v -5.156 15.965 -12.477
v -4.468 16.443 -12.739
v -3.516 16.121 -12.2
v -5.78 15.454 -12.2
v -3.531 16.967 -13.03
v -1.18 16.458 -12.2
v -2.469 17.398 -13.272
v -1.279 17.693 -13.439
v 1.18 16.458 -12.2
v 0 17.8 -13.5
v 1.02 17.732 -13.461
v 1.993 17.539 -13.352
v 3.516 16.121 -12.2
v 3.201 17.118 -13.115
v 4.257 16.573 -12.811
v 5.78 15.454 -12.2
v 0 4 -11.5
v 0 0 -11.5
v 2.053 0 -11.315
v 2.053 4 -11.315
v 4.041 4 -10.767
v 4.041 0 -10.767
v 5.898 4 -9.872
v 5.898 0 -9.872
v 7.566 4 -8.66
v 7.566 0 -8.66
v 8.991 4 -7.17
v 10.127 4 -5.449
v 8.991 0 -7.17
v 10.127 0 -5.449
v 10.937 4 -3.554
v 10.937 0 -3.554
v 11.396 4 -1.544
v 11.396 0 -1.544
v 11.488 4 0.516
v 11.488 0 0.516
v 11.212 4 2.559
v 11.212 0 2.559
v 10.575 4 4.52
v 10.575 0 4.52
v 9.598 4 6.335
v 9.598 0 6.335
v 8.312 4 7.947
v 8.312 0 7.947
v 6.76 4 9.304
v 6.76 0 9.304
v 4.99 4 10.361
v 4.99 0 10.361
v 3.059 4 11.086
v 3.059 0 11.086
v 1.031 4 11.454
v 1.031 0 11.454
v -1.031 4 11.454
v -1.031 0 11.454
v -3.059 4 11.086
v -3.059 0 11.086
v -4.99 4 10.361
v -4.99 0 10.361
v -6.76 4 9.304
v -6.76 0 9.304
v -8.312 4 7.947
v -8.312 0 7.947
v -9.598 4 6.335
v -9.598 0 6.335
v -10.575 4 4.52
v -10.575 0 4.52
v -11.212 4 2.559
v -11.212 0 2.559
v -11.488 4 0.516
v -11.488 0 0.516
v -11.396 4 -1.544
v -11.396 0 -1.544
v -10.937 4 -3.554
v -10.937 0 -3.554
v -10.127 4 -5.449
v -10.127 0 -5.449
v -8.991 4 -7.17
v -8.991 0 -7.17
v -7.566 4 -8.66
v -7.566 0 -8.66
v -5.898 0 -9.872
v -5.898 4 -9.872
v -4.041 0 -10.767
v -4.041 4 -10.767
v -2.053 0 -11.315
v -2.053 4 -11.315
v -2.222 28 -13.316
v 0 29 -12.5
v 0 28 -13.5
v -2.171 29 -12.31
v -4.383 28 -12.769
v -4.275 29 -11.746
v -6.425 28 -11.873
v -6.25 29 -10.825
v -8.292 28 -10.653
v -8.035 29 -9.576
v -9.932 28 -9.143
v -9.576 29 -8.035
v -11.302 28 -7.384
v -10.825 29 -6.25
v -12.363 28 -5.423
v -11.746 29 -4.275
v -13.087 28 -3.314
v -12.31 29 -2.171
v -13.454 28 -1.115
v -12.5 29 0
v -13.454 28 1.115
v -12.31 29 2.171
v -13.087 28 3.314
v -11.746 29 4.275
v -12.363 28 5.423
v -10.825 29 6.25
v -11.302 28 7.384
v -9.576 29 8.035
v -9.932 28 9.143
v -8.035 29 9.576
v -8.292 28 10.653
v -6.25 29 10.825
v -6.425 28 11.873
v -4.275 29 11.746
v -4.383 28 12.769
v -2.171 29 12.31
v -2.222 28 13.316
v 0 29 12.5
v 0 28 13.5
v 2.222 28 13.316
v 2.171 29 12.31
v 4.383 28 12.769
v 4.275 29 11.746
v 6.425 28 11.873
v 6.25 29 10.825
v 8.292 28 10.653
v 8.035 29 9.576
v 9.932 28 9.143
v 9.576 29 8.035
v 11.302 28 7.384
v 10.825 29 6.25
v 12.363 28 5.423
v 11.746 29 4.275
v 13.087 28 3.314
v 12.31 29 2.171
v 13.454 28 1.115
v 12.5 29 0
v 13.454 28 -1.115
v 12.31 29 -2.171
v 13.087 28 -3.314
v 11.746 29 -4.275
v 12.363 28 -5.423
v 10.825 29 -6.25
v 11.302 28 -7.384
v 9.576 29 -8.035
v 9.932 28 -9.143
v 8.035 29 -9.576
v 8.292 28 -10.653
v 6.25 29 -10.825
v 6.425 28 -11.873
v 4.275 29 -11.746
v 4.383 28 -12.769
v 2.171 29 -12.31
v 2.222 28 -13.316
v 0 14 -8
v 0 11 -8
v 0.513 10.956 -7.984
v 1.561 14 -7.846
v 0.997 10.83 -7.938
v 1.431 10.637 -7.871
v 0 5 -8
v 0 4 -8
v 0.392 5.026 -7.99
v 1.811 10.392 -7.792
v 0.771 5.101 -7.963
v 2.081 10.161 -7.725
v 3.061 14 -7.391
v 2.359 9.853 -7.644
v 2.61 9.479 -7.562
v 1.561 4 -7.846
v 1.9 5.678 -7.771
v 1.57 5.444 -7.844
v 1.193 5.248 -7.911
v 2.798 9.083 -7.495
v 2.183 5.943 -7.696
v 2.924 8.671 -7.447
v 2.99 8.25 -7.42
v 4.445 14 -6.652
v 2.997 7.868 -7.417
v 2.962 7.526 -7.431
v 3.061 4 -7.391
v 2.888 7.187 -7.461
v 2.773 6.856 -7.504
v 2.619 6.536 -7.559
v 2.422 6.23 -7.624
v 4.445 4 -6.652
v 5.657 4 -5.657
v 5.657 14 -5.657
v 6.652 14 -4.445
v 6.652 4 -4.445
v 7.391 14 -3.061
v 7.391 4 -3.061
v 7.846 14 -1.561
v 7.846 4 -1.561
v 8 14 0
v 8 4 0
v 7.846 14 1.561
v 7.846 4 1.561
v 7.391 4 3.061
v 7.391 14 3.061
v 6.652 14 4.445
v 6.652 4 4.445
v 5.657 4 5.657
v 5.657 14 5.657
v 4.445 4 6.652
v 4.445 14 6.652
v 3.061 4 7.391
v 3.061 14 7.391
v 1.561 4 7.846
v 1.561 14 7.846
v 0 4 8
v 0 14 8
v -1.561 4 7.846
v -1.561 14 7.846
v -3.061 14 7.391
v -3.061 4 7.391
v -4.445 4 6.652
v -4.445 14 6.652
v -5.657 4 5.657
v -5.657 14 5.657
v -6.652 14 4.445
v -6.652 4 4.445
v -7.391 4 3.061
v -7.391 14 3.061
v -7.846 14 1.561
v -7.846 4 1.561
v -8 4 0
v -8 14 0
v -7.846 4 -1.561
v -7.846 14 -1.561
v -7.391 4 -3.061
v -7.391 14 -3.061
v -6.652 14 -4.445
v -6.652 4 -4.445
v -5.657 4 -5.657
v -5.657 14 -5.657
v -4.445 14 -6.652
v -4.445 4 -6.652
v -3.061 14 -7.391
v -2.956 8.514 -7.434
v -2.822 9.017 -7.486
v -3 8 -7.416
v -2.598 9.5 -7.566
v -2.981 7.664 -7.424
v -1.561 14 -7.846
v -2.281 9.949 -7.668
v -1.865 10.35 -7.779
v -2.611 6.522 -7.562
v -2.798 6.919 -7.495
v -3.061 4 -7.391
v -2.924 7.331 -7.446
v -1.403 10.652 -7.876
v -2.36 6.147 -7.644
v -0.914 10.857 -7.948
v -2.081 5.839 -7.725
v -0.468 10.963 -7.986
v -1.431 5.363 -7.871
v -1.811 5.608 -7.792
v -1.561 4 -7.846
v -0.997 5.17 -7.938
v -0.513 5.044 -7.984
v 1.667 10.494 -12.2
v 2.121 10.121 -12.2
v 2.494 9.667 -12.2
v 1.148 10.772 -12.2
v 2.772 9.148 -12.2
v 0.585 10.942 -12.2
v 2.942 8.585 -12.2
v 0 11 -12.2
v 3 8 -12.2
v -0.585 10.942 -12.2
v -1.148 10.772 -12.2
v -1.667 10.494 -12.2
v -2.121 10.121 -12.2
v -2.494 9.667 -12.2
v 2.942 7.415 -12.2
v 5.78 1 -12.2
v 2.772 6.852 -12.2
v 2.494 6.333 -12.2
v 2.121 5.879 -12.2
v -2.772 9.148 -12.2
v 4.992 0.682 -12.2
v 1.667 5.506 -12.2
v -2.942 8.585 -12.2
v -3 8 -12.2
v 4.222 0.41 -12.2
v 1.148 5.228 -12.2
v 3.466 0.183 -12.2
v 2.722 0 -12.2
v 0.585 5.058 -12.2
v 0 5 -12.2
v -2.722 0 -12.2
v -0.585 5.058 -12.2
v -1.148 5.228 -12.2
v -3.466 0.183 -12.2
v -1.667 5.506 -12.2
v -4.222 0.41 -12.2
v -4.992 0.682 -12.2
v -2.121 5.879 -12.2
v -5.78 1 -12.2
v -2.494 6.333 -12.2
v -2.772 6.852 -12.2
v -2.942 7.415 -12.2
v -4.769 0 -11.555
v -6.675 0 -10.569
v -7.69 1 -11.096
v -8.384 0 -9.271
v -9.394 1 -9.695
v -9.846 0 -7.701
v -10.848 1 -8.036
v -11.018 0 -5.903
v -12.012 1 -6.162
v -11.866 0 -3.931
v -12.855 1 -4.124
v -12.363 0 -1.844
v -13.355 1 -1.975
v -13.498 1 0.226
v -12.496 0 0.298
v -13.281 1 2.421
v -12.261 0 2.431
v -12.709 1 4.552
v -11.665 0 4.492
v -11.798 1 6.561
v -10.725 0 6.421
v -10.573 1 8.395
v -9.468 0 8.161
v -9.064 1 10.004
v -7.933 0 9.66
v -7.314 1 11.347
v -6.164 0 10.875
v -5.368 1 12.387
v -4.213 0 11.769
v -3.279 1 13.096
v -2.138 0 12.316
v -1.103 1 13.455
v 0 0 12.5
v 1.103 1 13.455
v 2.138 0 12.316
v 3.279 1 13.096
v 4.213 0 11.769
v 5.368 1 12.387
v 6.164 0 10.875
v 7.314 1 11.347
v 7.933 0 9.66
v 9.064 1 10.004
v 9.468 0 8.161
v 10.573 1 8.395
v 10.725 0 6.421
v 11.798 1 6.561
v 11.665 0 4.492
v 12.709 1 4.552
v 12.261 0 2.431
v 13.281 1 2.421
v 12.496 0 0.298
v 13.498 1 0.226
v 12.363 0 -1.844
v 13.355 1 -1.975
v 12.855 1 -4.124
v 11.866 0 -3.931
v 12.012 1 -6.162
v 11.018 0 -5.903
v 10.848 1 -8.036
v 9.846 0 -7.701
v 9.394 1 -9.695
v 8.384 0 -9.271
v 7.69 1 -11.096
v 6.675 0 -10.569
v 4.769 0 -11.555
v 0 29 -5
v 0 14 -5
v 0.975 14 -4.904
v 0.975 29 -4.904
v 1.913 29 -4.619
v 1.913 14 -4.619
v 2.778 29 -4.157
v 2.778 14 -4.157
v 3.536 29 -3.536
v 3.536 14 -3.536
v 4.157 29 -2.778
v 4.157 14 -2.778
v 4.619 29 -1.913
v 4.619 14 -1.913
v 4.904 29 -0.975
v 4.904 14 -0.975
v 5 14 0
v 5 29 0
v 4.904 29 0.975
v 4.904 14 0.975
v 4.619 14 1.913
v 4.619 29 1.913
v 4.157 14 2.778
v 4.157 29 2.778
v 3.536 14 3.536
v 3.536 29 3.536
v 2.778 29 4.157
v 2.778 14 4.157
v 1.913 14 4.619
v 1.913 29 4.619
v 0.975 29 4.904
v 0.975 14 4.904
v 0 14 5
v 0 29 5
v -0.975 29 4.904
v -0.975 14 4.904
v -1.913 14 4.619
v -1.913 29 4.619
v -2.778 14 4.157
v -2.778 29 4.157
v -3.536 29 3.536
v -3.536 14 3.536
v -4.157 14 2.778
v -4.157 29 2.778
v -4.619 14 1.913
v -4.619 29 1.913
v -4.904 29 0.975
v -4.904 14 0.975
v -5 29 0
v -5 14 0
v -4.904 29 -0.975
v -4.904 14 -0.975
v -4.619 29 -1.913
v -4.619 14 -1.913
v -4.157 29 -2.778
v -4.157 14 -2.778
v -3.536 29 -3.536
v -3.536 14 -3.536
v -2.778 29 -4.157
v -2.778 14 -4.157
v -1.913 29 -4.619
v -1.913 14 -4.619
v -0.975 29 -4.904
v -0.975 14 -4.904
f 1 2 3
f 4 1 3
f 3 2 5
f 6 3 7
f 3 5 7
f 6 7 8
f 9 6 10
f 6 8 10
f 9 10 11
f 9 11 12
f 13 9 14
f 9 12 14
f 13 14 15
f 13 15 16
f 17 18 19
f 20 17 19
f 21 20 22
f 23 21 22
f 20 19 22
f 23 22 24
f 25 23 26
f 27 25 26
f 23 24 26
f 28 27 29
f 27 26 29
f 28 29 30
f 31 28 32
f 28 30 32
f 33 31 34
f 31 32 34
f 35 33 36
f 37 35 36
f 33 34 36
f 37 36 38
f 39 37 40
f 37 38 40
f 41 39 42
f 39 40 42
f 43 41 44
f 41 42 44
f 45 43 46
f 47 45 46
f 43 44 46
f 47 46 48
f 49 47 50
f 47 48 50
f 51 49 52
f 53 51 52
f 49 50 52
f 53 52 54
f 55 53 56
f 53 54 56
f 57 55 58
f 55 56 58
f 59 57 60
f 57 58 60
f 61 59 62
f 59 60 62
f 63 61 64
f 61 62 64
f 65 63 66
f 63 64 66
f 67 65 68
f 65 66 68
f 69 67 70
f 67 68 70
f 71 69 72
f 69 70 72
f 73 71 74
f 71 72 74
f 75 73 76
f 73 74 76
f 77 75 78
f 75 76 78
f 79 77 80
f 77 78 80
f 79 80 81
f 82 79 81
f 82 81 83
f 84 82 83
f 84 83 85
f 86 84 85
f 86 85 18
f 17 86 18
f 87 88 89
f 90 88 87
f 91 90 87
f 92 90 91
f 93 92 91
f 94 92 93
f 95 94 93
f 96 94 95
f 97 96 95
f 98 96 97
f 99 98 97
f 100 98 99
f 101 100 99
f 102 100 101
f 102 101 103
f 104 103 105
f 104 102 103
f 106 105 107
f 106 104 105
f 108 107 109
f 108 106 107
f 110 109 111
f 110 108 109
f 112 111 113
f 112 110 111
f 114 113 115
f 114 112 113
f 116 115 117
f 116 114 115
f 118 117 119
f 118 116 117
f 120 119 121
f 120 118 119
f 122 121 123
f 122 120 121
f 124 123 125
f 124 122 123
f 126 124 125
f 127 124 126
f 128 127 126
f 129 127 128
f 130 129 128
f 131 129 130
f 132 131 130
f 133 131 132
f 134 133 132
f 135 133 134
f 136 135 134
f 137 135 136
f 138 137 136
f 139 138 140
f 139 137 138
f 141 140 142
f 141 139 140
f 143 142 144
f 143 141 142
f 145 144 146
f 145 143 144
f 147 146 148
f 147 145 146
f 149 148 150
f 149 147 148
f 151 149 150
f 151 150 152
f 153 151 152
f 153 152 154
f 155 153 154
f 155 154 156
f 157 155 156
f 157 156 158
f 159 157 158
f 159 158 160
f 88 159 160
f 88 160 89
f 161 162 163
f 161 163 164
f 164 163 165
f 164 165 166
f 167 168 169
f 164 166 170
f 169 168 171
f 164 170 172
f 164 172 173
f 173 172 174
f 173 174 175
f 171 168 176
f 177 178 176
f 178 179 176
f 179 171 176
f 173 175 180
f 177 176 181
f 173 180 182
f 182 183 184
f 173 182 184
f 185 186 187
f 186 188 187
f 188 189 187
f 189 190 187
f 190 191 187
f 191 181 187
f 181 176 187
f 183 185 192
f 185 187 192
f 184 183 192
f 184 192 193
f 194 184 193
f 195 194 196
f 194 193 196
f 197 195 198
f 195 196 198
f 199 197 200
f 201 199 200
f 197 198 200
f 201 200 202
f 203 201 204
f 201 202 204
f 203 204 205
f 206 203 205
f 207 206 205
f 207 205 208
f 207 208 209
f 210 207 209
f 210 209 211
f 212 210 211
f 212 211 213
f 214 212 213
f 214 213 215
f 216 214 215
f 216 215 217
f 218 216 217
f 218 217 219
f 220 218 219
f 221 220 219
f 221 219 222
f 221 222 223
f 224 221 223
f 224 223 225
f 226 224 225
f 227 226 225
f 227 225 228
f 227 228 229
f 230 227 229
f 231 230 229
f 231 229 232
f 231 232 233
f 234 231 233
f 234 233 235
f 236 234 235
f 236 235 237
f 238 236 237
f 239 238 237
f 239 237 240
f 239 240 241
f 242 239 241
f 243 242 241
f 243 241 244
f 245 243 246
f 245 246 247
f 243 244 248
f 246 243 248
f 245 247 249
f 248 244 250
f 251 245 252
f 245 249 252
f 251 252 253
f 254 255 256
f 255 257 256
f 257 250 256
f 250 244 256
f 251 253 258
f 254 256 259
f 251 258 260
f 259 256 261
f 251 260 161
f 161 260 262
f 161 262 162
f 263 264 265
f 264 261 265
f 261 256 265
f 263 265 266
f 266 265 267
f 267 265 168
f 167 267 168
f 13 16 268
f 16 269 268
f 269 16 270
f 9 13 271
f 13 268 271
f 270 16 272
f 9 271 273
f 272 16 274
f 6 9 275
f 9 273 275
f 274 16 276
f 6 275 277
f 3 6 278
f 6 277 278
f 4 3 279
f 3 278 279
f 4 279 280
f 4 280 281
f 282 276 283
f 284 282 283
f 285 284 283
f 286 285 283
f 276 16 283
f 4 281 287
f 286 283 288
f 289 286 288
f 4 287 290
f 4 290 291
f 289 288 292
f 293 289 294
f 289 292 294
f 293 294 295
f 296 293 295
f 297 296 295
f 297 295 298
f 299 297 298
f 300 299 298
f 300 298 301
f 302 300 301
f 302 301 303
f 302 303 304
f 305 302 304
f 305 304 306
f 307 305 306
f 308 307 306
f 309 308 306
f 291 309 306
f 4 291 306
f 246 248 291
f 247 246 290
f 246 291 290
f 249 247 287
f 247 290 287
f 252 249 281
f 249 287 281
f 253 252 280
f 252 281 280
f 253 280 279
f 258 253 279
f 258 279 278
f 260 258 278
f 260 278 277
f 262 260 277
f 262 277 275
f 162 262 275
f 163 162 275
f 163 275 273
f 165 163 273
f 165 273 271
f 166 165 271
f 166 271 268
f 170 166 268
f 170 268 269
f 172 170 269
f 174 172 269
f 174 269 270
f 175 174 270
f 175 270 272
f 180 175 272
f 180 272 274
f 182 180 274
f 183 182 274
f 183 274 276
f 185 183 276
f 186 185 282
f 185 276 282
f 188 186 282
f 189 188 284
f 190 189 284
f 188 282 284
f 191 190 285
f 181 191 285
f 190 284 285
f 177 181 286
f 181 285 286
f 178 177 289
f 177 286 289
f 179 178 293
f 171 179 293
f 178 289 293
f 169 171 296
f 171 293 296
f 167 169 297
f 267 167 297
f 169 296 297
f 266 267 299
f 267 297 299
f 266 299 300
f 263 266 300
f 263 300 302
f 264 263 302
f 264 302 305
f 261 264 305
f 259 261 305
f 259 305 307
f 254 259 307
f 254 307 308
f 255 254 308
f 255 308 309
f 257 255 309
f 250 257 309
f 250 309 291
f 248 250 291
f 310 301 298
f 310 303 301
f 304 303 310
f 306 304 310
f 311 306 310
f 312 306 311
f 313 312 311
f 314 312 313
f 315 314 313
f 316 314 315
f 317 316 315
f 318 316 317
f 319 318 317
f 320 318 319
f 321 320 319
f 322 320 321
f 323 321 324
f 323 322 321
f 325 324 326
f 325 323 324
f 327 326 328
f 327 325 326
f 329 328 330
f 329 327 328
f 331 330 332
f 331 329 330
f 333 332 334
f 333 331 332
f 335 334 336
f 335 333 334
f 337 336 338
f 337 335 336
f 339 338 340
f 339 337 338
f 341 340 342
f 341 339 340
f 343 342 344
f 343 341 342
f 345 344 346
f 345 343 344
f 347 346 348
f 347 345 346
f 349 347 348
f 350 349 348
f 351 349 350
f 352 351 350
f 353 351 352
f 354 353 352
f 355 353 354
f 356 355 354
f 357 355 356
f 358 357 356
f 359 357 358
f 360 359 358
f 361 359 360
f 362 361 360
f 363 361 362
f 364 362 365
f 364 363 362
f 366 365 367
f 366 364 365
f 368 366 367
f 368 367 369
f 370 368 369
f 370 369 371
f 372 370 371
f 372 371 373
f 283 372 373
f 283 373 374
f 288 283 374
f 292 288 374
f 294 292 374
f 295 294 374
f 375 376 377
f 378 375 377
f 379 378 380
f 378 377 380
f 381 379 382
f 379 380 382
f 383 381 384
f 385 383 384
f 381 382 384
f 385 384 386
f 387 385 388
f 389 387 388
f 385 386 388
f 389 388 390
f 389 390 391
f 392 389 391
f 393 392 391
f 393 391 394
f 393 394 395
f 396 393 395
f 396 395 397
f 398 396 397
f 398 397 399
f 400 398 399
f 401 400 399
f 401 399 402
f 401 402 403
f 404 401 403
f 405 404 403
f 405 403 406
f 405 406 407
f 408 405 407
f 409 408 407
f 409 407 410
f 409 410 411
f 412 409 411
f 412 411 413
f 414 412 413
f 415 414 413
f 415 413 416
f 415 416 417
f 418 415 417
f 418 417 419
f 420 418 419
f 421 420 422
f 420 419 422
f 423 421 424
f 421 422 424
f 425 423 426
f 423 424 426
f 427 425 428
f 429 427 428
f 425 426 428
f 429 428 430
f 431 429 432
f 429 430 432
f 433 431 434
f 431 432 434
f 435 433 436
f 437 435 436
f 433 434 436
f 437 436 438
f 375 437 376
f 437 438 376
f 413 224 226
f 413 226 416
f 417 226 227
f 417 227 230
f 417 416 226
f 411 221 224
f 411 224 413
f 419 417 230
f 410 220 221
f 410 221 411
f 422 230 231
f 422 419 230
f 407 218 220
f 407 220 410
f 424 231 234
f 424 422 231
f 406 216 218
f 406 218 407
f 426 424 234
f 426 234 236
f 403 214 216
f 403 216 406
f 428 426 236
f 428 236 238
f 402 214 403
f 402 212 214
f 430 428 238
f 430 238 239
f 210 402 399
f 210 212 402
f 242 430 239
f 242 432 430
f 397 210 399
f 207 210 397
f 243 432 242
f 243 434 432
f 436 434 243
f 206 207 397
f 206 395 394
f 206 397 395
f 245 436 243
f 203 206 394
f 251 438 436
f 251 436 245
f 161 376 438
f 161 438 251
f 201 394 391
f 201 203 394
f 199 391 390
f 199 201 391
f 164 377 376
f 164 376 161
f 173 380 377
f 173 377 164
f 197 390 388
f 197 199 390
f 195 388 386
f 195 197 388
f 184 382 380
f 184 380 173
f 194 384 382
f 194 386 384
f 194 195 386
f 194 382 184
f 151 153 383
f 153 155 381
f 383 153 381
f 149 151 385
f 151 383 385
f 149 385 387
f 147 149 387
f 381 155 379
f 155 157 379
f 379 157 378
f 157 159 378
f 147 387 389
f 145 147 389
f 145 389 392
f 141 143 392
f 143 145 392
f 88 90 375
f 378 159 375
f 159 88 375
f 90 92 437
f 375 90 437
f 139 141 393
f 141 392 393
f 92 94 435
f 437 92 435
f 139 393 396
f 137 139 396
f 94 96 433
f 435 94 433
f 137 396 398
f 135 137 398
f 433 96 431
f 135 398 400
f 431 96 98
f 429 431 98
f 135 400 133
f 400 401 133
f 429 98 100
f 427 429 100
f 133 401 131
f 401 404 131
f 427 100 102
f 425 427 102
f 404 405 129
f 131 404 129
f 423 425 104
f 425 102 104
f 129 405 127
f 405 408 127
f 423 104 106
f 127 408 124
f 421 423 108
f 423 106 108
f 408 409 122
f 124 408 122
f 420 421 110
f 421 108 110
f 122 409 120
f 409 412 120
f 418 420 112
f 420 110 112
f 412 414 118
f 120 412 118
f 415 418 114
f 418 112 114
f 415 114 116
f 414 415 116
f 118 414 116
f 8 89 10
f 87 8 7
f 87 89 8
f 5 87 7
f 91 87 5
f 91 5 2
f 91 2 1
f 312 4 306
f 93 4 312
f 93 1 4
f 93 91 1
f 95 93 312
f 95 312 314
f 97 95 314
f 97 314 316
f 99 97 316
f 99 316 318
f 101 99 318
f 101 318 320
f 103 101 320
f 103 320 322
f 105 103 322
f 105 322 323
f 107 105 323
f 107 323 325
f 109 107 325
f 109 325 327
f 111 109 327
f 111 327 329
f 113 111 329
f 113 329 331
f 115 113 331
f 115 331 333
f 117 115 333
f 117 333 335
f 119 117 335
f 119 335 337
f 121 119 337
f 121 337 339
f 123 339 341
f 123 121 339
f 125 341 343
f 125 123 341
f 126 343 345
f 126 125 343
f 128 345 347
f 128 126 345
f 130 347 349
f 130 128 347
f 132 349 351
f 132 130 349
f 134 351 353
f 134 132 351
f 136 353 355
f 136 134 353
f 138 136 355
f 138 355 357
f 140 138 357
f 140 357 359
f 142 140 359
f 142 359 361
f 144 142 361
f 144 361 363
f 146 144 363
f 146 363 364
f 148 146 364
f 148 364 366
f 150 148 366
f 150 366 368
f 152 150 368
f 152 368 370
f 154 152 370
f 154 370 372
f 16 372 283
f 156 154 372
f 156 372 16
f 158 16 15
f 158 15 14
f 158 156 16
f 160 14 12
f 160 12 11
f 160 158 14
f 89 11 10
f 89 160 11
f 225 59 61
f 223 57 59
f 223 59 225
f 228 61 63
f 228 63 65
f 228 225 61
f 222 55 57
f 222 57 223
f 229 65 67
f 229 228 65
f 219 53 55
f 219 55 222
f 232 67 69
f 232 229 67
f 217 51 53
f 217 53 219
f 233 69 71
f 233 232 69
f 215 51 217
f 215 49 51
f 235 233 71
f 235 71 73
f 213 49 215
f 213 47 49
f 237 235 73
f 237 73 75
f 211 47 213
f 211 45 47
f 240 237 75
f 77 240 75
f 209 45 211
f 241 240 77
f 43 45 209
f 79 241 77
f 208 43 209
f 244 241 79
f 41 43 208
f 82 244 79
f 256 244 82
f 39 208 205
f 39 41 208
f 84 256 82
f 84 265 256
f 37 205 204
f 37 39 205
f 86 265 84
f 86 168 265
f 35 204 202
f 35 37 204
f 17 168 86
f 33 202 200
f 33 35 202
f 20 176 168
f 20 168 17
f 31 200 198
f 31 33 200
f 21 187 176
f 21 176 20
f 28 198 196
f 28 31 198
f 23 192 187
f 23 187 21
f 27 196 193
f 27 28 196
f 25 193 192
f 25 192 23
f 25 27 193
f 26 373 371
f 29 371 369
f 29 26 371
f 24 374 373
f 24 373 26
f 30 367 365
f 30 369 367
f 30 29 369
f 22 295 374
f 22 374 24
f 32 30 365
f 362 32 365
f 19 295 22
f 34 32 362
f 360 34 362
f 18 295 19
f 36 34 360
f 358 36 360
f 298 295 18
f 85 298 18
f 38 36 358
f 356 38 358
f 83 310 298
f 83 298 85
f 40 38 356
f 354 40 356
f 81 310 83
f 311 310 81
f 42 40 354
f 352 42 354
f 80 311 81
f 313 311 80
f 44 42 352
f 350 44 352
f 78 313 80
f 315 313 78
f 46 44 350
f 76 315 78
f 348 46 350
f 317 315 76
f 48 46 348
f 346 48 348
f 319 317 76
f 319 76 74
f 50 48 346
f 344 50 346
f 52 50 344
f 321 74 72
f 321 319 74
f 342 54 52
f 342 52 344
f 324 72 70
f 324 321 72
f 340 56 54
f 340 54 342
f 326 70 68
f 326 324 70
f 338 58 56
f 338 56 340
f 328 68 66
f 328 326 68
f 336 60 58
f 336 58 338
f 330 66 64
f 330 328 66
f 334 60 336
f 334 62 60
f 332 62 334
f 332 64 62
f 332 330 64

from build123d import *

# Parameters (mm, degrees)
ESQUISSE1_W             = 13.5
ESQUISSE1_H             = 29
ESQUISSE2_R             = 11.5
ENL_V_MAT_EXTRU_1_DEPTH = 4
CHANFREIN1_SIZE         = 1
ESQUISSE4_R             = 8
ENL_V_MAT_EXTRU_2_DEPTH = 10
ESQUISSE5_R             = 5
ENL_V_MAT_EXTRU_3_DEPTH = 25.279621196
ENL_V_MAT_EXTRU_4_REACH = 43.033
ESQUISSE6_R             = 3


with BuildPart() as part:
    # Esquisse1 → Base-Révolution (revolve)
    with BuildSketch(Plane.XY, mode=Mode.PRIVATE) as base_r_volution_sk:
        with Locations((6.75, 14.5)):
            Rectangle(ESQUISSE1_W, ESQUISSE1_H)
    revolve(base_r_volution_sk.sketch.rotate(Axis((0, 0, 0), (0, 1, 0)), 90), axis=Axis((0, 0, 0), (0, 1, 0)))

    # Esquisse2 → Enlèv. mat.-Extru.1 (cut)
    with BuildSketch(Plane.XZ):
        with Locations(Location((0, 0, 0), (0, 0, 270))):
            Circle(ESQUISSE2_R)
    extrude(amount=-ENL_V_MAT_EXTRU_1_DEPTH, mode=Mode.SUBTRACT)

    # Chanfrein1
    chanfrein1_edges = [part.edges().sort_by_distance(p)[0] for p in [
        (0, 0, 13.5),
        (0, 29, 13.5),
    ]]
    chamfer(chanfrein1_edges, length=CHANFREIN1_SIZE)

    # Esquisse3 → Enlèvement de matière-Révolution1 (revolve, cut)
    with BuildSketch(Plane(origin=(0, 0, 0), x_dir=(1, 0, 0), z_dir=(0, 1, 0))):
        Polygon((0, 12.2), (16.5, 12.2), (21.5, 17.2), (0, 17.2), align=None)
    revolve(axis=Axis((0, 0, 0), (0, 0, -1)), mode=Mode.SUBTRACT)

    # Esquisse4 → Enlèv. mat.-Extru.2 (cut)
    with BuildSketch(Plane.XZ.offset(-4)):
        with Locations(Location((0, 0, 0), (0, 0, 270))):
            Circle(ESQUISSE4_R)
    extrude(amount=-ENL_V_MAT_EXTRU_2_DEPTH, mode=Mode.SUBTRACT)

    # Esquisse5 → Enlèv. mat.-Extru.3 (cut, through all)
    with BuildSketch(Plane.XZ.offset(-14)):
        with Locations(Location((0, 0, 0), (0, 0, 270))):
            Circle(ESQUISSE5_R)
    extrude(amount=-ENL_V_MAT_EXTRU_3_DEPTH, mode=Mode.SUBTRACT)

    # Esquisse6 → Enlèv. mat.-Extru.4 (cut, up to next)
    with BuildSketch(Plane(origin=(0, 0, -12.2), x_dir=(-1, 0, 0), z_dir=(0, 0, -1)), mode=Mode.PRIVATE) as enl_v_mat_extru_4_sk1:
        with Locations((0, 8)):
            Circle(ESQUISSE6_R)
    enl_v_mat_extru_4_tool1 = extrude(enl_v_mat_extru_4_sk1.sketch, amount=-ENL_V_MAT_EXTRU_4_REACH, mode=Mode.PRIVATE) & part.part
    add(enl_v_mat_extru_4_tool1.solids().sort_by_distance((0, 8, -12.2))[0], mode=Mode.SUBTRACT)


solid = part.part
